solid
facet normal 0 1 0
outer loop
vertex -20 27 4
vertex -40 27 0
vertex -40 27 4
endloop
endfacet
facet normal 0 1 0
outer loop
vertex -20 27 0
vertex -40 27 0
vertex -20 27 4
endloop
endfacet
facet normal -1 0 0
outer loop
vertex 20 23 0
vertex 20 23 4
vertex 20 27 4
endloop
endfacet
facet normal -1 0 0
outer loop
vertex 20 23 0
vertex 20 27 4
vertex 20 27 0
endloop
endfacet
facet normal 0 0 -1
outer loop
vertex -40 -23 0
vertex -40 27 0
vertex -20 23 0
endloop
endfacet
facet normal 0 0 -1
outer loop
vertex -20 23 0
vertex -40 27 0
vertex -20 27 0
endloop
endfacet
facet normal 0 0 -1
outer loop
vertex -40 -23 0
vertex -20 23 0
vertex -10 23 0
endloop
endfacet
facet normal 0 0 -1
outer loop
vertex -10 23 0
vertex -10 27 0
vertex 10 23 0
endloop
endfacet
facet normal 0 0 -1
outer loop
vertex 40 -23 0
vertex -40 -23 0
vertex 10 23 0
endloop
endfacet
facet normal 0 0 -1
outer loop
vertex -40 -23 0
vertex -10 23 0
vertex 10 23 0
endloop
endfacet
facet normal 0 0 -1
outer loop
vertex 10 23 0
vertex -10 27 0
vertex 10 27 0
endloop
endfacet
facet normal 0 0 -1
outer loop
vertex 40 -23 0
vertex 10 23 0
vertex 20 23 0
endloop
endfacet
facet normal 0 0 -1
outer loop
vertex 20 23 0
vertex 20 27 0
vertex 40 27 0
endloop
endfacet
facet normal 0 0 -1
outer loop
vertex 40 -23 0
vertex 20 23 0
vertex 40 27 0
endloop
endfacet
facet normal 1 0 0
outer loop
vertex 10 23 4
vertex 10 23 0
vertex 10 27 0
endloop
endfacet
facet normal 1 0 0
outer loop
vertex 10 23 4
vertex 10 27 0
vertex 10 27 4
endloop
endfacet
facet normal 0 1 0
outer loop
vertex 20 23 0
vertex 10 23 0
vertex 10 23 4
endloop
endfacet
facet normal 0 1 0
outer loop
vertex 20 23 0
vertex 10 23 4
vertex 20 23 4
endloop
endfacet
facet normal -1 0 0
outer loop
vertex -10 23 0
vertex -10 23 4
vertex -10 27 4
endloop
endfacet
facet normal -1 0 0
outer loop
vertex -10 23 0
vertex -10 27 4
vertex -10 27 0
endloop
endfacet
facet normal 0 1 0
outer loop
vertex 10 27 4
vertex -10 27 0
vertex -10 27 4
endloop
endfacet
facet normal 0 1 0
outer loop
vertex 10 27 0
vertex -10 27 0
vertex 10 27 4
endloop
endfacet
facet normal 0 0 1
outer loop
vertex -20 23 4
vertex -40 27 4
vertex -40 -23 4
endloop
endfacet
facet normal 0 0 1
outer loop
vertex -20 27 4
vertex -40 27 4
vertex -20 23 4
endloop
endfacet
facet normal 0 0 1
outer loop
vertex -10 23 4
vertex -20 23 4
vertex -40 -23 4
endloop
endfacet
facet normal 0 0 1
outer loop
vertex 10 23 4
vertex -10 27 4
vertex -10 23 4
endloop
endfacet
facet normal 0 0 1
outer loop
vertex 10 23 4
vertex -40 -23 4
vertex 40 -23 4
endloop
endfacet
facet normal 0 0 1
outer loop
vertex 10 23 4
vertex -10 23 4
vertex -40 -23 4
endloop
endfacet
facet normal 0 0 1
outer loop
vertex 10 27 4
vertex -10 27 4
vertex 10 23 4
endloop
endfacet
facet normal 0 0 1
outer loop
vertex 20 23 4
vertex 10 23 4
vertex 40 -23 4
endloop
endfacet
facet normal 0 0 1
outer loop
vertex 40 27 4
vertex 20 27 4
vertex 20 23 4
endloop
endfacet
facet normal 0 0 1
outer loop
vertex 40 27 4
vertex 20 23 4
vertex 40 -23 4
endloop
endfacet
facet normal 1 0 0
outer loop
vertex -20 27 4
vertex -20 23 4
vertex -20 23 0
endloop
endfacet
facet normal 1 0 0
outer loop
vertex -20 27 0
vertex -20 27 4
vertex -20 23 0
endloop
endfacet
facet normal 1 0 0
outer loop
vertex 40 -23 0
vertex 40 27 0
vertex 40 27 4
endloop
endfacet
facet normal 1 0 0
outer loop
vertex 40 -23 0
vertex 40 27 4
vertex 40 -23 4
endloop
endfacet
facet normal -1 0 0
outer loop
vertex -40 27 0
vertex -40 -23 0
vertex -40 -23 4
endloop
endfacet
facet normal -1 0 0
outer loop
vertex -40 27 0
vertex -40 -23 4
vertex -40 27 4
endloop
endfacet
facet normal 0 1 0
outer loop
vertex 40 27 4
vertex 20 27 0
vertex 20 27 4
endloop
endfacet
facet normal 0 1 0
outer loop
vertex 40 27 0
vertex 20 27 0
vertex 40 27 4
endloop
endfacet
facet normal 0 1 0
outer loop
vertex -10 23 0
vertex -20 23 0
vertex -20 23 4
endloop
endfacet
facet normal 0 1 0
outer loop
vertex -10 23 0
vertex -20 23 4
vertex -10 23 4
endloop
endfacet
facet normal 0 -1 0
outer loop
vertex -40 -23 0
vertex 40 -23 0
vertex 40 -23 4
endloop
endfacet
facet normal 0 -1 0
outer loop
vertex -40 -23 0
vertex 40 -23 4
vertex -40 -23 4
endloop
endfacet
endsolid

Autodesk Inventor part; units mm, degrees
ref_plane "YZ Plane" through (0, 0, 0) normal (1, 0, 0) x (0, 1, 0)
ref_plane "XZ Plane" through (0, 0, 0) normal (0, 1, 0) x (-1, 0, 0)
ref_plane "XY Plane" through (0, 0, 0) normal (0, 0, 1) x (1, 0, 0)
sketch "Эскиз1" plane through (0, 0, 0) normal (0, 0, 1) x (1, 0, 0)
  line L0 (-40, 23) -> (40, 23)
  line L1 (40, 23) -> (40, -23)
  line L2 (40, -23) -> (-40, -23)
  line L3 (-40, -23) -> (-40, 23)
  line L4 (-40, 23) -> (40, -23) construction
  line L5 (40, 23) -> (-40, -23) construction
  point P0 (0, 0)
  dimension "d0" = 80
  dimension "d1" = 46
extrude "Выдавливание1" add sketch "Эскиз1" along normal blind 4
sketch "Эскиз2" plane through (-40, 23, 0) normal (0, 1, 0) x (1, 0, 0)
  line L0 (0, -4) -> (80, -4) projected
  line L1 (0, 0) -> (80, 0) projected
  line L2 (0, -4) -> (20, -4)
  line L3 (20, -4) -> (20, 0)
  line L4 (20, 0) -> (0, 0)
  line L5 (0, 0) -> (0, -4)
  line L6 (80, -4) -> (60, -4)
  line L7 (60, -4) -> (60, 0)
  line L8 (60, 0) -> (80, 0)
  line L9 (80, 0) -> (80, -4)
  line L10 (50, -4) -> (30, -4)
  line L11 (30, -4) -> (30, 0)
  line L12 (30, 0) -> (50, 0)
  line L13 (50, 0) -> (50, -4)
  point P0 (40, 0)
  point P1 (30, -2)
  point P2 (20, -2)
  point P3 (60, -2)
  point P4 (50, -2)
  dimension "d4" = 10
  dimension "d6" = 20
extrude "Выдавливание2" add sketch "Эскиз2" along normal blind 4 contours L5 L1 L3 L0 | L11 L1 L13 L0 | L7 L1 L9 L0
properties part number "стенка"
